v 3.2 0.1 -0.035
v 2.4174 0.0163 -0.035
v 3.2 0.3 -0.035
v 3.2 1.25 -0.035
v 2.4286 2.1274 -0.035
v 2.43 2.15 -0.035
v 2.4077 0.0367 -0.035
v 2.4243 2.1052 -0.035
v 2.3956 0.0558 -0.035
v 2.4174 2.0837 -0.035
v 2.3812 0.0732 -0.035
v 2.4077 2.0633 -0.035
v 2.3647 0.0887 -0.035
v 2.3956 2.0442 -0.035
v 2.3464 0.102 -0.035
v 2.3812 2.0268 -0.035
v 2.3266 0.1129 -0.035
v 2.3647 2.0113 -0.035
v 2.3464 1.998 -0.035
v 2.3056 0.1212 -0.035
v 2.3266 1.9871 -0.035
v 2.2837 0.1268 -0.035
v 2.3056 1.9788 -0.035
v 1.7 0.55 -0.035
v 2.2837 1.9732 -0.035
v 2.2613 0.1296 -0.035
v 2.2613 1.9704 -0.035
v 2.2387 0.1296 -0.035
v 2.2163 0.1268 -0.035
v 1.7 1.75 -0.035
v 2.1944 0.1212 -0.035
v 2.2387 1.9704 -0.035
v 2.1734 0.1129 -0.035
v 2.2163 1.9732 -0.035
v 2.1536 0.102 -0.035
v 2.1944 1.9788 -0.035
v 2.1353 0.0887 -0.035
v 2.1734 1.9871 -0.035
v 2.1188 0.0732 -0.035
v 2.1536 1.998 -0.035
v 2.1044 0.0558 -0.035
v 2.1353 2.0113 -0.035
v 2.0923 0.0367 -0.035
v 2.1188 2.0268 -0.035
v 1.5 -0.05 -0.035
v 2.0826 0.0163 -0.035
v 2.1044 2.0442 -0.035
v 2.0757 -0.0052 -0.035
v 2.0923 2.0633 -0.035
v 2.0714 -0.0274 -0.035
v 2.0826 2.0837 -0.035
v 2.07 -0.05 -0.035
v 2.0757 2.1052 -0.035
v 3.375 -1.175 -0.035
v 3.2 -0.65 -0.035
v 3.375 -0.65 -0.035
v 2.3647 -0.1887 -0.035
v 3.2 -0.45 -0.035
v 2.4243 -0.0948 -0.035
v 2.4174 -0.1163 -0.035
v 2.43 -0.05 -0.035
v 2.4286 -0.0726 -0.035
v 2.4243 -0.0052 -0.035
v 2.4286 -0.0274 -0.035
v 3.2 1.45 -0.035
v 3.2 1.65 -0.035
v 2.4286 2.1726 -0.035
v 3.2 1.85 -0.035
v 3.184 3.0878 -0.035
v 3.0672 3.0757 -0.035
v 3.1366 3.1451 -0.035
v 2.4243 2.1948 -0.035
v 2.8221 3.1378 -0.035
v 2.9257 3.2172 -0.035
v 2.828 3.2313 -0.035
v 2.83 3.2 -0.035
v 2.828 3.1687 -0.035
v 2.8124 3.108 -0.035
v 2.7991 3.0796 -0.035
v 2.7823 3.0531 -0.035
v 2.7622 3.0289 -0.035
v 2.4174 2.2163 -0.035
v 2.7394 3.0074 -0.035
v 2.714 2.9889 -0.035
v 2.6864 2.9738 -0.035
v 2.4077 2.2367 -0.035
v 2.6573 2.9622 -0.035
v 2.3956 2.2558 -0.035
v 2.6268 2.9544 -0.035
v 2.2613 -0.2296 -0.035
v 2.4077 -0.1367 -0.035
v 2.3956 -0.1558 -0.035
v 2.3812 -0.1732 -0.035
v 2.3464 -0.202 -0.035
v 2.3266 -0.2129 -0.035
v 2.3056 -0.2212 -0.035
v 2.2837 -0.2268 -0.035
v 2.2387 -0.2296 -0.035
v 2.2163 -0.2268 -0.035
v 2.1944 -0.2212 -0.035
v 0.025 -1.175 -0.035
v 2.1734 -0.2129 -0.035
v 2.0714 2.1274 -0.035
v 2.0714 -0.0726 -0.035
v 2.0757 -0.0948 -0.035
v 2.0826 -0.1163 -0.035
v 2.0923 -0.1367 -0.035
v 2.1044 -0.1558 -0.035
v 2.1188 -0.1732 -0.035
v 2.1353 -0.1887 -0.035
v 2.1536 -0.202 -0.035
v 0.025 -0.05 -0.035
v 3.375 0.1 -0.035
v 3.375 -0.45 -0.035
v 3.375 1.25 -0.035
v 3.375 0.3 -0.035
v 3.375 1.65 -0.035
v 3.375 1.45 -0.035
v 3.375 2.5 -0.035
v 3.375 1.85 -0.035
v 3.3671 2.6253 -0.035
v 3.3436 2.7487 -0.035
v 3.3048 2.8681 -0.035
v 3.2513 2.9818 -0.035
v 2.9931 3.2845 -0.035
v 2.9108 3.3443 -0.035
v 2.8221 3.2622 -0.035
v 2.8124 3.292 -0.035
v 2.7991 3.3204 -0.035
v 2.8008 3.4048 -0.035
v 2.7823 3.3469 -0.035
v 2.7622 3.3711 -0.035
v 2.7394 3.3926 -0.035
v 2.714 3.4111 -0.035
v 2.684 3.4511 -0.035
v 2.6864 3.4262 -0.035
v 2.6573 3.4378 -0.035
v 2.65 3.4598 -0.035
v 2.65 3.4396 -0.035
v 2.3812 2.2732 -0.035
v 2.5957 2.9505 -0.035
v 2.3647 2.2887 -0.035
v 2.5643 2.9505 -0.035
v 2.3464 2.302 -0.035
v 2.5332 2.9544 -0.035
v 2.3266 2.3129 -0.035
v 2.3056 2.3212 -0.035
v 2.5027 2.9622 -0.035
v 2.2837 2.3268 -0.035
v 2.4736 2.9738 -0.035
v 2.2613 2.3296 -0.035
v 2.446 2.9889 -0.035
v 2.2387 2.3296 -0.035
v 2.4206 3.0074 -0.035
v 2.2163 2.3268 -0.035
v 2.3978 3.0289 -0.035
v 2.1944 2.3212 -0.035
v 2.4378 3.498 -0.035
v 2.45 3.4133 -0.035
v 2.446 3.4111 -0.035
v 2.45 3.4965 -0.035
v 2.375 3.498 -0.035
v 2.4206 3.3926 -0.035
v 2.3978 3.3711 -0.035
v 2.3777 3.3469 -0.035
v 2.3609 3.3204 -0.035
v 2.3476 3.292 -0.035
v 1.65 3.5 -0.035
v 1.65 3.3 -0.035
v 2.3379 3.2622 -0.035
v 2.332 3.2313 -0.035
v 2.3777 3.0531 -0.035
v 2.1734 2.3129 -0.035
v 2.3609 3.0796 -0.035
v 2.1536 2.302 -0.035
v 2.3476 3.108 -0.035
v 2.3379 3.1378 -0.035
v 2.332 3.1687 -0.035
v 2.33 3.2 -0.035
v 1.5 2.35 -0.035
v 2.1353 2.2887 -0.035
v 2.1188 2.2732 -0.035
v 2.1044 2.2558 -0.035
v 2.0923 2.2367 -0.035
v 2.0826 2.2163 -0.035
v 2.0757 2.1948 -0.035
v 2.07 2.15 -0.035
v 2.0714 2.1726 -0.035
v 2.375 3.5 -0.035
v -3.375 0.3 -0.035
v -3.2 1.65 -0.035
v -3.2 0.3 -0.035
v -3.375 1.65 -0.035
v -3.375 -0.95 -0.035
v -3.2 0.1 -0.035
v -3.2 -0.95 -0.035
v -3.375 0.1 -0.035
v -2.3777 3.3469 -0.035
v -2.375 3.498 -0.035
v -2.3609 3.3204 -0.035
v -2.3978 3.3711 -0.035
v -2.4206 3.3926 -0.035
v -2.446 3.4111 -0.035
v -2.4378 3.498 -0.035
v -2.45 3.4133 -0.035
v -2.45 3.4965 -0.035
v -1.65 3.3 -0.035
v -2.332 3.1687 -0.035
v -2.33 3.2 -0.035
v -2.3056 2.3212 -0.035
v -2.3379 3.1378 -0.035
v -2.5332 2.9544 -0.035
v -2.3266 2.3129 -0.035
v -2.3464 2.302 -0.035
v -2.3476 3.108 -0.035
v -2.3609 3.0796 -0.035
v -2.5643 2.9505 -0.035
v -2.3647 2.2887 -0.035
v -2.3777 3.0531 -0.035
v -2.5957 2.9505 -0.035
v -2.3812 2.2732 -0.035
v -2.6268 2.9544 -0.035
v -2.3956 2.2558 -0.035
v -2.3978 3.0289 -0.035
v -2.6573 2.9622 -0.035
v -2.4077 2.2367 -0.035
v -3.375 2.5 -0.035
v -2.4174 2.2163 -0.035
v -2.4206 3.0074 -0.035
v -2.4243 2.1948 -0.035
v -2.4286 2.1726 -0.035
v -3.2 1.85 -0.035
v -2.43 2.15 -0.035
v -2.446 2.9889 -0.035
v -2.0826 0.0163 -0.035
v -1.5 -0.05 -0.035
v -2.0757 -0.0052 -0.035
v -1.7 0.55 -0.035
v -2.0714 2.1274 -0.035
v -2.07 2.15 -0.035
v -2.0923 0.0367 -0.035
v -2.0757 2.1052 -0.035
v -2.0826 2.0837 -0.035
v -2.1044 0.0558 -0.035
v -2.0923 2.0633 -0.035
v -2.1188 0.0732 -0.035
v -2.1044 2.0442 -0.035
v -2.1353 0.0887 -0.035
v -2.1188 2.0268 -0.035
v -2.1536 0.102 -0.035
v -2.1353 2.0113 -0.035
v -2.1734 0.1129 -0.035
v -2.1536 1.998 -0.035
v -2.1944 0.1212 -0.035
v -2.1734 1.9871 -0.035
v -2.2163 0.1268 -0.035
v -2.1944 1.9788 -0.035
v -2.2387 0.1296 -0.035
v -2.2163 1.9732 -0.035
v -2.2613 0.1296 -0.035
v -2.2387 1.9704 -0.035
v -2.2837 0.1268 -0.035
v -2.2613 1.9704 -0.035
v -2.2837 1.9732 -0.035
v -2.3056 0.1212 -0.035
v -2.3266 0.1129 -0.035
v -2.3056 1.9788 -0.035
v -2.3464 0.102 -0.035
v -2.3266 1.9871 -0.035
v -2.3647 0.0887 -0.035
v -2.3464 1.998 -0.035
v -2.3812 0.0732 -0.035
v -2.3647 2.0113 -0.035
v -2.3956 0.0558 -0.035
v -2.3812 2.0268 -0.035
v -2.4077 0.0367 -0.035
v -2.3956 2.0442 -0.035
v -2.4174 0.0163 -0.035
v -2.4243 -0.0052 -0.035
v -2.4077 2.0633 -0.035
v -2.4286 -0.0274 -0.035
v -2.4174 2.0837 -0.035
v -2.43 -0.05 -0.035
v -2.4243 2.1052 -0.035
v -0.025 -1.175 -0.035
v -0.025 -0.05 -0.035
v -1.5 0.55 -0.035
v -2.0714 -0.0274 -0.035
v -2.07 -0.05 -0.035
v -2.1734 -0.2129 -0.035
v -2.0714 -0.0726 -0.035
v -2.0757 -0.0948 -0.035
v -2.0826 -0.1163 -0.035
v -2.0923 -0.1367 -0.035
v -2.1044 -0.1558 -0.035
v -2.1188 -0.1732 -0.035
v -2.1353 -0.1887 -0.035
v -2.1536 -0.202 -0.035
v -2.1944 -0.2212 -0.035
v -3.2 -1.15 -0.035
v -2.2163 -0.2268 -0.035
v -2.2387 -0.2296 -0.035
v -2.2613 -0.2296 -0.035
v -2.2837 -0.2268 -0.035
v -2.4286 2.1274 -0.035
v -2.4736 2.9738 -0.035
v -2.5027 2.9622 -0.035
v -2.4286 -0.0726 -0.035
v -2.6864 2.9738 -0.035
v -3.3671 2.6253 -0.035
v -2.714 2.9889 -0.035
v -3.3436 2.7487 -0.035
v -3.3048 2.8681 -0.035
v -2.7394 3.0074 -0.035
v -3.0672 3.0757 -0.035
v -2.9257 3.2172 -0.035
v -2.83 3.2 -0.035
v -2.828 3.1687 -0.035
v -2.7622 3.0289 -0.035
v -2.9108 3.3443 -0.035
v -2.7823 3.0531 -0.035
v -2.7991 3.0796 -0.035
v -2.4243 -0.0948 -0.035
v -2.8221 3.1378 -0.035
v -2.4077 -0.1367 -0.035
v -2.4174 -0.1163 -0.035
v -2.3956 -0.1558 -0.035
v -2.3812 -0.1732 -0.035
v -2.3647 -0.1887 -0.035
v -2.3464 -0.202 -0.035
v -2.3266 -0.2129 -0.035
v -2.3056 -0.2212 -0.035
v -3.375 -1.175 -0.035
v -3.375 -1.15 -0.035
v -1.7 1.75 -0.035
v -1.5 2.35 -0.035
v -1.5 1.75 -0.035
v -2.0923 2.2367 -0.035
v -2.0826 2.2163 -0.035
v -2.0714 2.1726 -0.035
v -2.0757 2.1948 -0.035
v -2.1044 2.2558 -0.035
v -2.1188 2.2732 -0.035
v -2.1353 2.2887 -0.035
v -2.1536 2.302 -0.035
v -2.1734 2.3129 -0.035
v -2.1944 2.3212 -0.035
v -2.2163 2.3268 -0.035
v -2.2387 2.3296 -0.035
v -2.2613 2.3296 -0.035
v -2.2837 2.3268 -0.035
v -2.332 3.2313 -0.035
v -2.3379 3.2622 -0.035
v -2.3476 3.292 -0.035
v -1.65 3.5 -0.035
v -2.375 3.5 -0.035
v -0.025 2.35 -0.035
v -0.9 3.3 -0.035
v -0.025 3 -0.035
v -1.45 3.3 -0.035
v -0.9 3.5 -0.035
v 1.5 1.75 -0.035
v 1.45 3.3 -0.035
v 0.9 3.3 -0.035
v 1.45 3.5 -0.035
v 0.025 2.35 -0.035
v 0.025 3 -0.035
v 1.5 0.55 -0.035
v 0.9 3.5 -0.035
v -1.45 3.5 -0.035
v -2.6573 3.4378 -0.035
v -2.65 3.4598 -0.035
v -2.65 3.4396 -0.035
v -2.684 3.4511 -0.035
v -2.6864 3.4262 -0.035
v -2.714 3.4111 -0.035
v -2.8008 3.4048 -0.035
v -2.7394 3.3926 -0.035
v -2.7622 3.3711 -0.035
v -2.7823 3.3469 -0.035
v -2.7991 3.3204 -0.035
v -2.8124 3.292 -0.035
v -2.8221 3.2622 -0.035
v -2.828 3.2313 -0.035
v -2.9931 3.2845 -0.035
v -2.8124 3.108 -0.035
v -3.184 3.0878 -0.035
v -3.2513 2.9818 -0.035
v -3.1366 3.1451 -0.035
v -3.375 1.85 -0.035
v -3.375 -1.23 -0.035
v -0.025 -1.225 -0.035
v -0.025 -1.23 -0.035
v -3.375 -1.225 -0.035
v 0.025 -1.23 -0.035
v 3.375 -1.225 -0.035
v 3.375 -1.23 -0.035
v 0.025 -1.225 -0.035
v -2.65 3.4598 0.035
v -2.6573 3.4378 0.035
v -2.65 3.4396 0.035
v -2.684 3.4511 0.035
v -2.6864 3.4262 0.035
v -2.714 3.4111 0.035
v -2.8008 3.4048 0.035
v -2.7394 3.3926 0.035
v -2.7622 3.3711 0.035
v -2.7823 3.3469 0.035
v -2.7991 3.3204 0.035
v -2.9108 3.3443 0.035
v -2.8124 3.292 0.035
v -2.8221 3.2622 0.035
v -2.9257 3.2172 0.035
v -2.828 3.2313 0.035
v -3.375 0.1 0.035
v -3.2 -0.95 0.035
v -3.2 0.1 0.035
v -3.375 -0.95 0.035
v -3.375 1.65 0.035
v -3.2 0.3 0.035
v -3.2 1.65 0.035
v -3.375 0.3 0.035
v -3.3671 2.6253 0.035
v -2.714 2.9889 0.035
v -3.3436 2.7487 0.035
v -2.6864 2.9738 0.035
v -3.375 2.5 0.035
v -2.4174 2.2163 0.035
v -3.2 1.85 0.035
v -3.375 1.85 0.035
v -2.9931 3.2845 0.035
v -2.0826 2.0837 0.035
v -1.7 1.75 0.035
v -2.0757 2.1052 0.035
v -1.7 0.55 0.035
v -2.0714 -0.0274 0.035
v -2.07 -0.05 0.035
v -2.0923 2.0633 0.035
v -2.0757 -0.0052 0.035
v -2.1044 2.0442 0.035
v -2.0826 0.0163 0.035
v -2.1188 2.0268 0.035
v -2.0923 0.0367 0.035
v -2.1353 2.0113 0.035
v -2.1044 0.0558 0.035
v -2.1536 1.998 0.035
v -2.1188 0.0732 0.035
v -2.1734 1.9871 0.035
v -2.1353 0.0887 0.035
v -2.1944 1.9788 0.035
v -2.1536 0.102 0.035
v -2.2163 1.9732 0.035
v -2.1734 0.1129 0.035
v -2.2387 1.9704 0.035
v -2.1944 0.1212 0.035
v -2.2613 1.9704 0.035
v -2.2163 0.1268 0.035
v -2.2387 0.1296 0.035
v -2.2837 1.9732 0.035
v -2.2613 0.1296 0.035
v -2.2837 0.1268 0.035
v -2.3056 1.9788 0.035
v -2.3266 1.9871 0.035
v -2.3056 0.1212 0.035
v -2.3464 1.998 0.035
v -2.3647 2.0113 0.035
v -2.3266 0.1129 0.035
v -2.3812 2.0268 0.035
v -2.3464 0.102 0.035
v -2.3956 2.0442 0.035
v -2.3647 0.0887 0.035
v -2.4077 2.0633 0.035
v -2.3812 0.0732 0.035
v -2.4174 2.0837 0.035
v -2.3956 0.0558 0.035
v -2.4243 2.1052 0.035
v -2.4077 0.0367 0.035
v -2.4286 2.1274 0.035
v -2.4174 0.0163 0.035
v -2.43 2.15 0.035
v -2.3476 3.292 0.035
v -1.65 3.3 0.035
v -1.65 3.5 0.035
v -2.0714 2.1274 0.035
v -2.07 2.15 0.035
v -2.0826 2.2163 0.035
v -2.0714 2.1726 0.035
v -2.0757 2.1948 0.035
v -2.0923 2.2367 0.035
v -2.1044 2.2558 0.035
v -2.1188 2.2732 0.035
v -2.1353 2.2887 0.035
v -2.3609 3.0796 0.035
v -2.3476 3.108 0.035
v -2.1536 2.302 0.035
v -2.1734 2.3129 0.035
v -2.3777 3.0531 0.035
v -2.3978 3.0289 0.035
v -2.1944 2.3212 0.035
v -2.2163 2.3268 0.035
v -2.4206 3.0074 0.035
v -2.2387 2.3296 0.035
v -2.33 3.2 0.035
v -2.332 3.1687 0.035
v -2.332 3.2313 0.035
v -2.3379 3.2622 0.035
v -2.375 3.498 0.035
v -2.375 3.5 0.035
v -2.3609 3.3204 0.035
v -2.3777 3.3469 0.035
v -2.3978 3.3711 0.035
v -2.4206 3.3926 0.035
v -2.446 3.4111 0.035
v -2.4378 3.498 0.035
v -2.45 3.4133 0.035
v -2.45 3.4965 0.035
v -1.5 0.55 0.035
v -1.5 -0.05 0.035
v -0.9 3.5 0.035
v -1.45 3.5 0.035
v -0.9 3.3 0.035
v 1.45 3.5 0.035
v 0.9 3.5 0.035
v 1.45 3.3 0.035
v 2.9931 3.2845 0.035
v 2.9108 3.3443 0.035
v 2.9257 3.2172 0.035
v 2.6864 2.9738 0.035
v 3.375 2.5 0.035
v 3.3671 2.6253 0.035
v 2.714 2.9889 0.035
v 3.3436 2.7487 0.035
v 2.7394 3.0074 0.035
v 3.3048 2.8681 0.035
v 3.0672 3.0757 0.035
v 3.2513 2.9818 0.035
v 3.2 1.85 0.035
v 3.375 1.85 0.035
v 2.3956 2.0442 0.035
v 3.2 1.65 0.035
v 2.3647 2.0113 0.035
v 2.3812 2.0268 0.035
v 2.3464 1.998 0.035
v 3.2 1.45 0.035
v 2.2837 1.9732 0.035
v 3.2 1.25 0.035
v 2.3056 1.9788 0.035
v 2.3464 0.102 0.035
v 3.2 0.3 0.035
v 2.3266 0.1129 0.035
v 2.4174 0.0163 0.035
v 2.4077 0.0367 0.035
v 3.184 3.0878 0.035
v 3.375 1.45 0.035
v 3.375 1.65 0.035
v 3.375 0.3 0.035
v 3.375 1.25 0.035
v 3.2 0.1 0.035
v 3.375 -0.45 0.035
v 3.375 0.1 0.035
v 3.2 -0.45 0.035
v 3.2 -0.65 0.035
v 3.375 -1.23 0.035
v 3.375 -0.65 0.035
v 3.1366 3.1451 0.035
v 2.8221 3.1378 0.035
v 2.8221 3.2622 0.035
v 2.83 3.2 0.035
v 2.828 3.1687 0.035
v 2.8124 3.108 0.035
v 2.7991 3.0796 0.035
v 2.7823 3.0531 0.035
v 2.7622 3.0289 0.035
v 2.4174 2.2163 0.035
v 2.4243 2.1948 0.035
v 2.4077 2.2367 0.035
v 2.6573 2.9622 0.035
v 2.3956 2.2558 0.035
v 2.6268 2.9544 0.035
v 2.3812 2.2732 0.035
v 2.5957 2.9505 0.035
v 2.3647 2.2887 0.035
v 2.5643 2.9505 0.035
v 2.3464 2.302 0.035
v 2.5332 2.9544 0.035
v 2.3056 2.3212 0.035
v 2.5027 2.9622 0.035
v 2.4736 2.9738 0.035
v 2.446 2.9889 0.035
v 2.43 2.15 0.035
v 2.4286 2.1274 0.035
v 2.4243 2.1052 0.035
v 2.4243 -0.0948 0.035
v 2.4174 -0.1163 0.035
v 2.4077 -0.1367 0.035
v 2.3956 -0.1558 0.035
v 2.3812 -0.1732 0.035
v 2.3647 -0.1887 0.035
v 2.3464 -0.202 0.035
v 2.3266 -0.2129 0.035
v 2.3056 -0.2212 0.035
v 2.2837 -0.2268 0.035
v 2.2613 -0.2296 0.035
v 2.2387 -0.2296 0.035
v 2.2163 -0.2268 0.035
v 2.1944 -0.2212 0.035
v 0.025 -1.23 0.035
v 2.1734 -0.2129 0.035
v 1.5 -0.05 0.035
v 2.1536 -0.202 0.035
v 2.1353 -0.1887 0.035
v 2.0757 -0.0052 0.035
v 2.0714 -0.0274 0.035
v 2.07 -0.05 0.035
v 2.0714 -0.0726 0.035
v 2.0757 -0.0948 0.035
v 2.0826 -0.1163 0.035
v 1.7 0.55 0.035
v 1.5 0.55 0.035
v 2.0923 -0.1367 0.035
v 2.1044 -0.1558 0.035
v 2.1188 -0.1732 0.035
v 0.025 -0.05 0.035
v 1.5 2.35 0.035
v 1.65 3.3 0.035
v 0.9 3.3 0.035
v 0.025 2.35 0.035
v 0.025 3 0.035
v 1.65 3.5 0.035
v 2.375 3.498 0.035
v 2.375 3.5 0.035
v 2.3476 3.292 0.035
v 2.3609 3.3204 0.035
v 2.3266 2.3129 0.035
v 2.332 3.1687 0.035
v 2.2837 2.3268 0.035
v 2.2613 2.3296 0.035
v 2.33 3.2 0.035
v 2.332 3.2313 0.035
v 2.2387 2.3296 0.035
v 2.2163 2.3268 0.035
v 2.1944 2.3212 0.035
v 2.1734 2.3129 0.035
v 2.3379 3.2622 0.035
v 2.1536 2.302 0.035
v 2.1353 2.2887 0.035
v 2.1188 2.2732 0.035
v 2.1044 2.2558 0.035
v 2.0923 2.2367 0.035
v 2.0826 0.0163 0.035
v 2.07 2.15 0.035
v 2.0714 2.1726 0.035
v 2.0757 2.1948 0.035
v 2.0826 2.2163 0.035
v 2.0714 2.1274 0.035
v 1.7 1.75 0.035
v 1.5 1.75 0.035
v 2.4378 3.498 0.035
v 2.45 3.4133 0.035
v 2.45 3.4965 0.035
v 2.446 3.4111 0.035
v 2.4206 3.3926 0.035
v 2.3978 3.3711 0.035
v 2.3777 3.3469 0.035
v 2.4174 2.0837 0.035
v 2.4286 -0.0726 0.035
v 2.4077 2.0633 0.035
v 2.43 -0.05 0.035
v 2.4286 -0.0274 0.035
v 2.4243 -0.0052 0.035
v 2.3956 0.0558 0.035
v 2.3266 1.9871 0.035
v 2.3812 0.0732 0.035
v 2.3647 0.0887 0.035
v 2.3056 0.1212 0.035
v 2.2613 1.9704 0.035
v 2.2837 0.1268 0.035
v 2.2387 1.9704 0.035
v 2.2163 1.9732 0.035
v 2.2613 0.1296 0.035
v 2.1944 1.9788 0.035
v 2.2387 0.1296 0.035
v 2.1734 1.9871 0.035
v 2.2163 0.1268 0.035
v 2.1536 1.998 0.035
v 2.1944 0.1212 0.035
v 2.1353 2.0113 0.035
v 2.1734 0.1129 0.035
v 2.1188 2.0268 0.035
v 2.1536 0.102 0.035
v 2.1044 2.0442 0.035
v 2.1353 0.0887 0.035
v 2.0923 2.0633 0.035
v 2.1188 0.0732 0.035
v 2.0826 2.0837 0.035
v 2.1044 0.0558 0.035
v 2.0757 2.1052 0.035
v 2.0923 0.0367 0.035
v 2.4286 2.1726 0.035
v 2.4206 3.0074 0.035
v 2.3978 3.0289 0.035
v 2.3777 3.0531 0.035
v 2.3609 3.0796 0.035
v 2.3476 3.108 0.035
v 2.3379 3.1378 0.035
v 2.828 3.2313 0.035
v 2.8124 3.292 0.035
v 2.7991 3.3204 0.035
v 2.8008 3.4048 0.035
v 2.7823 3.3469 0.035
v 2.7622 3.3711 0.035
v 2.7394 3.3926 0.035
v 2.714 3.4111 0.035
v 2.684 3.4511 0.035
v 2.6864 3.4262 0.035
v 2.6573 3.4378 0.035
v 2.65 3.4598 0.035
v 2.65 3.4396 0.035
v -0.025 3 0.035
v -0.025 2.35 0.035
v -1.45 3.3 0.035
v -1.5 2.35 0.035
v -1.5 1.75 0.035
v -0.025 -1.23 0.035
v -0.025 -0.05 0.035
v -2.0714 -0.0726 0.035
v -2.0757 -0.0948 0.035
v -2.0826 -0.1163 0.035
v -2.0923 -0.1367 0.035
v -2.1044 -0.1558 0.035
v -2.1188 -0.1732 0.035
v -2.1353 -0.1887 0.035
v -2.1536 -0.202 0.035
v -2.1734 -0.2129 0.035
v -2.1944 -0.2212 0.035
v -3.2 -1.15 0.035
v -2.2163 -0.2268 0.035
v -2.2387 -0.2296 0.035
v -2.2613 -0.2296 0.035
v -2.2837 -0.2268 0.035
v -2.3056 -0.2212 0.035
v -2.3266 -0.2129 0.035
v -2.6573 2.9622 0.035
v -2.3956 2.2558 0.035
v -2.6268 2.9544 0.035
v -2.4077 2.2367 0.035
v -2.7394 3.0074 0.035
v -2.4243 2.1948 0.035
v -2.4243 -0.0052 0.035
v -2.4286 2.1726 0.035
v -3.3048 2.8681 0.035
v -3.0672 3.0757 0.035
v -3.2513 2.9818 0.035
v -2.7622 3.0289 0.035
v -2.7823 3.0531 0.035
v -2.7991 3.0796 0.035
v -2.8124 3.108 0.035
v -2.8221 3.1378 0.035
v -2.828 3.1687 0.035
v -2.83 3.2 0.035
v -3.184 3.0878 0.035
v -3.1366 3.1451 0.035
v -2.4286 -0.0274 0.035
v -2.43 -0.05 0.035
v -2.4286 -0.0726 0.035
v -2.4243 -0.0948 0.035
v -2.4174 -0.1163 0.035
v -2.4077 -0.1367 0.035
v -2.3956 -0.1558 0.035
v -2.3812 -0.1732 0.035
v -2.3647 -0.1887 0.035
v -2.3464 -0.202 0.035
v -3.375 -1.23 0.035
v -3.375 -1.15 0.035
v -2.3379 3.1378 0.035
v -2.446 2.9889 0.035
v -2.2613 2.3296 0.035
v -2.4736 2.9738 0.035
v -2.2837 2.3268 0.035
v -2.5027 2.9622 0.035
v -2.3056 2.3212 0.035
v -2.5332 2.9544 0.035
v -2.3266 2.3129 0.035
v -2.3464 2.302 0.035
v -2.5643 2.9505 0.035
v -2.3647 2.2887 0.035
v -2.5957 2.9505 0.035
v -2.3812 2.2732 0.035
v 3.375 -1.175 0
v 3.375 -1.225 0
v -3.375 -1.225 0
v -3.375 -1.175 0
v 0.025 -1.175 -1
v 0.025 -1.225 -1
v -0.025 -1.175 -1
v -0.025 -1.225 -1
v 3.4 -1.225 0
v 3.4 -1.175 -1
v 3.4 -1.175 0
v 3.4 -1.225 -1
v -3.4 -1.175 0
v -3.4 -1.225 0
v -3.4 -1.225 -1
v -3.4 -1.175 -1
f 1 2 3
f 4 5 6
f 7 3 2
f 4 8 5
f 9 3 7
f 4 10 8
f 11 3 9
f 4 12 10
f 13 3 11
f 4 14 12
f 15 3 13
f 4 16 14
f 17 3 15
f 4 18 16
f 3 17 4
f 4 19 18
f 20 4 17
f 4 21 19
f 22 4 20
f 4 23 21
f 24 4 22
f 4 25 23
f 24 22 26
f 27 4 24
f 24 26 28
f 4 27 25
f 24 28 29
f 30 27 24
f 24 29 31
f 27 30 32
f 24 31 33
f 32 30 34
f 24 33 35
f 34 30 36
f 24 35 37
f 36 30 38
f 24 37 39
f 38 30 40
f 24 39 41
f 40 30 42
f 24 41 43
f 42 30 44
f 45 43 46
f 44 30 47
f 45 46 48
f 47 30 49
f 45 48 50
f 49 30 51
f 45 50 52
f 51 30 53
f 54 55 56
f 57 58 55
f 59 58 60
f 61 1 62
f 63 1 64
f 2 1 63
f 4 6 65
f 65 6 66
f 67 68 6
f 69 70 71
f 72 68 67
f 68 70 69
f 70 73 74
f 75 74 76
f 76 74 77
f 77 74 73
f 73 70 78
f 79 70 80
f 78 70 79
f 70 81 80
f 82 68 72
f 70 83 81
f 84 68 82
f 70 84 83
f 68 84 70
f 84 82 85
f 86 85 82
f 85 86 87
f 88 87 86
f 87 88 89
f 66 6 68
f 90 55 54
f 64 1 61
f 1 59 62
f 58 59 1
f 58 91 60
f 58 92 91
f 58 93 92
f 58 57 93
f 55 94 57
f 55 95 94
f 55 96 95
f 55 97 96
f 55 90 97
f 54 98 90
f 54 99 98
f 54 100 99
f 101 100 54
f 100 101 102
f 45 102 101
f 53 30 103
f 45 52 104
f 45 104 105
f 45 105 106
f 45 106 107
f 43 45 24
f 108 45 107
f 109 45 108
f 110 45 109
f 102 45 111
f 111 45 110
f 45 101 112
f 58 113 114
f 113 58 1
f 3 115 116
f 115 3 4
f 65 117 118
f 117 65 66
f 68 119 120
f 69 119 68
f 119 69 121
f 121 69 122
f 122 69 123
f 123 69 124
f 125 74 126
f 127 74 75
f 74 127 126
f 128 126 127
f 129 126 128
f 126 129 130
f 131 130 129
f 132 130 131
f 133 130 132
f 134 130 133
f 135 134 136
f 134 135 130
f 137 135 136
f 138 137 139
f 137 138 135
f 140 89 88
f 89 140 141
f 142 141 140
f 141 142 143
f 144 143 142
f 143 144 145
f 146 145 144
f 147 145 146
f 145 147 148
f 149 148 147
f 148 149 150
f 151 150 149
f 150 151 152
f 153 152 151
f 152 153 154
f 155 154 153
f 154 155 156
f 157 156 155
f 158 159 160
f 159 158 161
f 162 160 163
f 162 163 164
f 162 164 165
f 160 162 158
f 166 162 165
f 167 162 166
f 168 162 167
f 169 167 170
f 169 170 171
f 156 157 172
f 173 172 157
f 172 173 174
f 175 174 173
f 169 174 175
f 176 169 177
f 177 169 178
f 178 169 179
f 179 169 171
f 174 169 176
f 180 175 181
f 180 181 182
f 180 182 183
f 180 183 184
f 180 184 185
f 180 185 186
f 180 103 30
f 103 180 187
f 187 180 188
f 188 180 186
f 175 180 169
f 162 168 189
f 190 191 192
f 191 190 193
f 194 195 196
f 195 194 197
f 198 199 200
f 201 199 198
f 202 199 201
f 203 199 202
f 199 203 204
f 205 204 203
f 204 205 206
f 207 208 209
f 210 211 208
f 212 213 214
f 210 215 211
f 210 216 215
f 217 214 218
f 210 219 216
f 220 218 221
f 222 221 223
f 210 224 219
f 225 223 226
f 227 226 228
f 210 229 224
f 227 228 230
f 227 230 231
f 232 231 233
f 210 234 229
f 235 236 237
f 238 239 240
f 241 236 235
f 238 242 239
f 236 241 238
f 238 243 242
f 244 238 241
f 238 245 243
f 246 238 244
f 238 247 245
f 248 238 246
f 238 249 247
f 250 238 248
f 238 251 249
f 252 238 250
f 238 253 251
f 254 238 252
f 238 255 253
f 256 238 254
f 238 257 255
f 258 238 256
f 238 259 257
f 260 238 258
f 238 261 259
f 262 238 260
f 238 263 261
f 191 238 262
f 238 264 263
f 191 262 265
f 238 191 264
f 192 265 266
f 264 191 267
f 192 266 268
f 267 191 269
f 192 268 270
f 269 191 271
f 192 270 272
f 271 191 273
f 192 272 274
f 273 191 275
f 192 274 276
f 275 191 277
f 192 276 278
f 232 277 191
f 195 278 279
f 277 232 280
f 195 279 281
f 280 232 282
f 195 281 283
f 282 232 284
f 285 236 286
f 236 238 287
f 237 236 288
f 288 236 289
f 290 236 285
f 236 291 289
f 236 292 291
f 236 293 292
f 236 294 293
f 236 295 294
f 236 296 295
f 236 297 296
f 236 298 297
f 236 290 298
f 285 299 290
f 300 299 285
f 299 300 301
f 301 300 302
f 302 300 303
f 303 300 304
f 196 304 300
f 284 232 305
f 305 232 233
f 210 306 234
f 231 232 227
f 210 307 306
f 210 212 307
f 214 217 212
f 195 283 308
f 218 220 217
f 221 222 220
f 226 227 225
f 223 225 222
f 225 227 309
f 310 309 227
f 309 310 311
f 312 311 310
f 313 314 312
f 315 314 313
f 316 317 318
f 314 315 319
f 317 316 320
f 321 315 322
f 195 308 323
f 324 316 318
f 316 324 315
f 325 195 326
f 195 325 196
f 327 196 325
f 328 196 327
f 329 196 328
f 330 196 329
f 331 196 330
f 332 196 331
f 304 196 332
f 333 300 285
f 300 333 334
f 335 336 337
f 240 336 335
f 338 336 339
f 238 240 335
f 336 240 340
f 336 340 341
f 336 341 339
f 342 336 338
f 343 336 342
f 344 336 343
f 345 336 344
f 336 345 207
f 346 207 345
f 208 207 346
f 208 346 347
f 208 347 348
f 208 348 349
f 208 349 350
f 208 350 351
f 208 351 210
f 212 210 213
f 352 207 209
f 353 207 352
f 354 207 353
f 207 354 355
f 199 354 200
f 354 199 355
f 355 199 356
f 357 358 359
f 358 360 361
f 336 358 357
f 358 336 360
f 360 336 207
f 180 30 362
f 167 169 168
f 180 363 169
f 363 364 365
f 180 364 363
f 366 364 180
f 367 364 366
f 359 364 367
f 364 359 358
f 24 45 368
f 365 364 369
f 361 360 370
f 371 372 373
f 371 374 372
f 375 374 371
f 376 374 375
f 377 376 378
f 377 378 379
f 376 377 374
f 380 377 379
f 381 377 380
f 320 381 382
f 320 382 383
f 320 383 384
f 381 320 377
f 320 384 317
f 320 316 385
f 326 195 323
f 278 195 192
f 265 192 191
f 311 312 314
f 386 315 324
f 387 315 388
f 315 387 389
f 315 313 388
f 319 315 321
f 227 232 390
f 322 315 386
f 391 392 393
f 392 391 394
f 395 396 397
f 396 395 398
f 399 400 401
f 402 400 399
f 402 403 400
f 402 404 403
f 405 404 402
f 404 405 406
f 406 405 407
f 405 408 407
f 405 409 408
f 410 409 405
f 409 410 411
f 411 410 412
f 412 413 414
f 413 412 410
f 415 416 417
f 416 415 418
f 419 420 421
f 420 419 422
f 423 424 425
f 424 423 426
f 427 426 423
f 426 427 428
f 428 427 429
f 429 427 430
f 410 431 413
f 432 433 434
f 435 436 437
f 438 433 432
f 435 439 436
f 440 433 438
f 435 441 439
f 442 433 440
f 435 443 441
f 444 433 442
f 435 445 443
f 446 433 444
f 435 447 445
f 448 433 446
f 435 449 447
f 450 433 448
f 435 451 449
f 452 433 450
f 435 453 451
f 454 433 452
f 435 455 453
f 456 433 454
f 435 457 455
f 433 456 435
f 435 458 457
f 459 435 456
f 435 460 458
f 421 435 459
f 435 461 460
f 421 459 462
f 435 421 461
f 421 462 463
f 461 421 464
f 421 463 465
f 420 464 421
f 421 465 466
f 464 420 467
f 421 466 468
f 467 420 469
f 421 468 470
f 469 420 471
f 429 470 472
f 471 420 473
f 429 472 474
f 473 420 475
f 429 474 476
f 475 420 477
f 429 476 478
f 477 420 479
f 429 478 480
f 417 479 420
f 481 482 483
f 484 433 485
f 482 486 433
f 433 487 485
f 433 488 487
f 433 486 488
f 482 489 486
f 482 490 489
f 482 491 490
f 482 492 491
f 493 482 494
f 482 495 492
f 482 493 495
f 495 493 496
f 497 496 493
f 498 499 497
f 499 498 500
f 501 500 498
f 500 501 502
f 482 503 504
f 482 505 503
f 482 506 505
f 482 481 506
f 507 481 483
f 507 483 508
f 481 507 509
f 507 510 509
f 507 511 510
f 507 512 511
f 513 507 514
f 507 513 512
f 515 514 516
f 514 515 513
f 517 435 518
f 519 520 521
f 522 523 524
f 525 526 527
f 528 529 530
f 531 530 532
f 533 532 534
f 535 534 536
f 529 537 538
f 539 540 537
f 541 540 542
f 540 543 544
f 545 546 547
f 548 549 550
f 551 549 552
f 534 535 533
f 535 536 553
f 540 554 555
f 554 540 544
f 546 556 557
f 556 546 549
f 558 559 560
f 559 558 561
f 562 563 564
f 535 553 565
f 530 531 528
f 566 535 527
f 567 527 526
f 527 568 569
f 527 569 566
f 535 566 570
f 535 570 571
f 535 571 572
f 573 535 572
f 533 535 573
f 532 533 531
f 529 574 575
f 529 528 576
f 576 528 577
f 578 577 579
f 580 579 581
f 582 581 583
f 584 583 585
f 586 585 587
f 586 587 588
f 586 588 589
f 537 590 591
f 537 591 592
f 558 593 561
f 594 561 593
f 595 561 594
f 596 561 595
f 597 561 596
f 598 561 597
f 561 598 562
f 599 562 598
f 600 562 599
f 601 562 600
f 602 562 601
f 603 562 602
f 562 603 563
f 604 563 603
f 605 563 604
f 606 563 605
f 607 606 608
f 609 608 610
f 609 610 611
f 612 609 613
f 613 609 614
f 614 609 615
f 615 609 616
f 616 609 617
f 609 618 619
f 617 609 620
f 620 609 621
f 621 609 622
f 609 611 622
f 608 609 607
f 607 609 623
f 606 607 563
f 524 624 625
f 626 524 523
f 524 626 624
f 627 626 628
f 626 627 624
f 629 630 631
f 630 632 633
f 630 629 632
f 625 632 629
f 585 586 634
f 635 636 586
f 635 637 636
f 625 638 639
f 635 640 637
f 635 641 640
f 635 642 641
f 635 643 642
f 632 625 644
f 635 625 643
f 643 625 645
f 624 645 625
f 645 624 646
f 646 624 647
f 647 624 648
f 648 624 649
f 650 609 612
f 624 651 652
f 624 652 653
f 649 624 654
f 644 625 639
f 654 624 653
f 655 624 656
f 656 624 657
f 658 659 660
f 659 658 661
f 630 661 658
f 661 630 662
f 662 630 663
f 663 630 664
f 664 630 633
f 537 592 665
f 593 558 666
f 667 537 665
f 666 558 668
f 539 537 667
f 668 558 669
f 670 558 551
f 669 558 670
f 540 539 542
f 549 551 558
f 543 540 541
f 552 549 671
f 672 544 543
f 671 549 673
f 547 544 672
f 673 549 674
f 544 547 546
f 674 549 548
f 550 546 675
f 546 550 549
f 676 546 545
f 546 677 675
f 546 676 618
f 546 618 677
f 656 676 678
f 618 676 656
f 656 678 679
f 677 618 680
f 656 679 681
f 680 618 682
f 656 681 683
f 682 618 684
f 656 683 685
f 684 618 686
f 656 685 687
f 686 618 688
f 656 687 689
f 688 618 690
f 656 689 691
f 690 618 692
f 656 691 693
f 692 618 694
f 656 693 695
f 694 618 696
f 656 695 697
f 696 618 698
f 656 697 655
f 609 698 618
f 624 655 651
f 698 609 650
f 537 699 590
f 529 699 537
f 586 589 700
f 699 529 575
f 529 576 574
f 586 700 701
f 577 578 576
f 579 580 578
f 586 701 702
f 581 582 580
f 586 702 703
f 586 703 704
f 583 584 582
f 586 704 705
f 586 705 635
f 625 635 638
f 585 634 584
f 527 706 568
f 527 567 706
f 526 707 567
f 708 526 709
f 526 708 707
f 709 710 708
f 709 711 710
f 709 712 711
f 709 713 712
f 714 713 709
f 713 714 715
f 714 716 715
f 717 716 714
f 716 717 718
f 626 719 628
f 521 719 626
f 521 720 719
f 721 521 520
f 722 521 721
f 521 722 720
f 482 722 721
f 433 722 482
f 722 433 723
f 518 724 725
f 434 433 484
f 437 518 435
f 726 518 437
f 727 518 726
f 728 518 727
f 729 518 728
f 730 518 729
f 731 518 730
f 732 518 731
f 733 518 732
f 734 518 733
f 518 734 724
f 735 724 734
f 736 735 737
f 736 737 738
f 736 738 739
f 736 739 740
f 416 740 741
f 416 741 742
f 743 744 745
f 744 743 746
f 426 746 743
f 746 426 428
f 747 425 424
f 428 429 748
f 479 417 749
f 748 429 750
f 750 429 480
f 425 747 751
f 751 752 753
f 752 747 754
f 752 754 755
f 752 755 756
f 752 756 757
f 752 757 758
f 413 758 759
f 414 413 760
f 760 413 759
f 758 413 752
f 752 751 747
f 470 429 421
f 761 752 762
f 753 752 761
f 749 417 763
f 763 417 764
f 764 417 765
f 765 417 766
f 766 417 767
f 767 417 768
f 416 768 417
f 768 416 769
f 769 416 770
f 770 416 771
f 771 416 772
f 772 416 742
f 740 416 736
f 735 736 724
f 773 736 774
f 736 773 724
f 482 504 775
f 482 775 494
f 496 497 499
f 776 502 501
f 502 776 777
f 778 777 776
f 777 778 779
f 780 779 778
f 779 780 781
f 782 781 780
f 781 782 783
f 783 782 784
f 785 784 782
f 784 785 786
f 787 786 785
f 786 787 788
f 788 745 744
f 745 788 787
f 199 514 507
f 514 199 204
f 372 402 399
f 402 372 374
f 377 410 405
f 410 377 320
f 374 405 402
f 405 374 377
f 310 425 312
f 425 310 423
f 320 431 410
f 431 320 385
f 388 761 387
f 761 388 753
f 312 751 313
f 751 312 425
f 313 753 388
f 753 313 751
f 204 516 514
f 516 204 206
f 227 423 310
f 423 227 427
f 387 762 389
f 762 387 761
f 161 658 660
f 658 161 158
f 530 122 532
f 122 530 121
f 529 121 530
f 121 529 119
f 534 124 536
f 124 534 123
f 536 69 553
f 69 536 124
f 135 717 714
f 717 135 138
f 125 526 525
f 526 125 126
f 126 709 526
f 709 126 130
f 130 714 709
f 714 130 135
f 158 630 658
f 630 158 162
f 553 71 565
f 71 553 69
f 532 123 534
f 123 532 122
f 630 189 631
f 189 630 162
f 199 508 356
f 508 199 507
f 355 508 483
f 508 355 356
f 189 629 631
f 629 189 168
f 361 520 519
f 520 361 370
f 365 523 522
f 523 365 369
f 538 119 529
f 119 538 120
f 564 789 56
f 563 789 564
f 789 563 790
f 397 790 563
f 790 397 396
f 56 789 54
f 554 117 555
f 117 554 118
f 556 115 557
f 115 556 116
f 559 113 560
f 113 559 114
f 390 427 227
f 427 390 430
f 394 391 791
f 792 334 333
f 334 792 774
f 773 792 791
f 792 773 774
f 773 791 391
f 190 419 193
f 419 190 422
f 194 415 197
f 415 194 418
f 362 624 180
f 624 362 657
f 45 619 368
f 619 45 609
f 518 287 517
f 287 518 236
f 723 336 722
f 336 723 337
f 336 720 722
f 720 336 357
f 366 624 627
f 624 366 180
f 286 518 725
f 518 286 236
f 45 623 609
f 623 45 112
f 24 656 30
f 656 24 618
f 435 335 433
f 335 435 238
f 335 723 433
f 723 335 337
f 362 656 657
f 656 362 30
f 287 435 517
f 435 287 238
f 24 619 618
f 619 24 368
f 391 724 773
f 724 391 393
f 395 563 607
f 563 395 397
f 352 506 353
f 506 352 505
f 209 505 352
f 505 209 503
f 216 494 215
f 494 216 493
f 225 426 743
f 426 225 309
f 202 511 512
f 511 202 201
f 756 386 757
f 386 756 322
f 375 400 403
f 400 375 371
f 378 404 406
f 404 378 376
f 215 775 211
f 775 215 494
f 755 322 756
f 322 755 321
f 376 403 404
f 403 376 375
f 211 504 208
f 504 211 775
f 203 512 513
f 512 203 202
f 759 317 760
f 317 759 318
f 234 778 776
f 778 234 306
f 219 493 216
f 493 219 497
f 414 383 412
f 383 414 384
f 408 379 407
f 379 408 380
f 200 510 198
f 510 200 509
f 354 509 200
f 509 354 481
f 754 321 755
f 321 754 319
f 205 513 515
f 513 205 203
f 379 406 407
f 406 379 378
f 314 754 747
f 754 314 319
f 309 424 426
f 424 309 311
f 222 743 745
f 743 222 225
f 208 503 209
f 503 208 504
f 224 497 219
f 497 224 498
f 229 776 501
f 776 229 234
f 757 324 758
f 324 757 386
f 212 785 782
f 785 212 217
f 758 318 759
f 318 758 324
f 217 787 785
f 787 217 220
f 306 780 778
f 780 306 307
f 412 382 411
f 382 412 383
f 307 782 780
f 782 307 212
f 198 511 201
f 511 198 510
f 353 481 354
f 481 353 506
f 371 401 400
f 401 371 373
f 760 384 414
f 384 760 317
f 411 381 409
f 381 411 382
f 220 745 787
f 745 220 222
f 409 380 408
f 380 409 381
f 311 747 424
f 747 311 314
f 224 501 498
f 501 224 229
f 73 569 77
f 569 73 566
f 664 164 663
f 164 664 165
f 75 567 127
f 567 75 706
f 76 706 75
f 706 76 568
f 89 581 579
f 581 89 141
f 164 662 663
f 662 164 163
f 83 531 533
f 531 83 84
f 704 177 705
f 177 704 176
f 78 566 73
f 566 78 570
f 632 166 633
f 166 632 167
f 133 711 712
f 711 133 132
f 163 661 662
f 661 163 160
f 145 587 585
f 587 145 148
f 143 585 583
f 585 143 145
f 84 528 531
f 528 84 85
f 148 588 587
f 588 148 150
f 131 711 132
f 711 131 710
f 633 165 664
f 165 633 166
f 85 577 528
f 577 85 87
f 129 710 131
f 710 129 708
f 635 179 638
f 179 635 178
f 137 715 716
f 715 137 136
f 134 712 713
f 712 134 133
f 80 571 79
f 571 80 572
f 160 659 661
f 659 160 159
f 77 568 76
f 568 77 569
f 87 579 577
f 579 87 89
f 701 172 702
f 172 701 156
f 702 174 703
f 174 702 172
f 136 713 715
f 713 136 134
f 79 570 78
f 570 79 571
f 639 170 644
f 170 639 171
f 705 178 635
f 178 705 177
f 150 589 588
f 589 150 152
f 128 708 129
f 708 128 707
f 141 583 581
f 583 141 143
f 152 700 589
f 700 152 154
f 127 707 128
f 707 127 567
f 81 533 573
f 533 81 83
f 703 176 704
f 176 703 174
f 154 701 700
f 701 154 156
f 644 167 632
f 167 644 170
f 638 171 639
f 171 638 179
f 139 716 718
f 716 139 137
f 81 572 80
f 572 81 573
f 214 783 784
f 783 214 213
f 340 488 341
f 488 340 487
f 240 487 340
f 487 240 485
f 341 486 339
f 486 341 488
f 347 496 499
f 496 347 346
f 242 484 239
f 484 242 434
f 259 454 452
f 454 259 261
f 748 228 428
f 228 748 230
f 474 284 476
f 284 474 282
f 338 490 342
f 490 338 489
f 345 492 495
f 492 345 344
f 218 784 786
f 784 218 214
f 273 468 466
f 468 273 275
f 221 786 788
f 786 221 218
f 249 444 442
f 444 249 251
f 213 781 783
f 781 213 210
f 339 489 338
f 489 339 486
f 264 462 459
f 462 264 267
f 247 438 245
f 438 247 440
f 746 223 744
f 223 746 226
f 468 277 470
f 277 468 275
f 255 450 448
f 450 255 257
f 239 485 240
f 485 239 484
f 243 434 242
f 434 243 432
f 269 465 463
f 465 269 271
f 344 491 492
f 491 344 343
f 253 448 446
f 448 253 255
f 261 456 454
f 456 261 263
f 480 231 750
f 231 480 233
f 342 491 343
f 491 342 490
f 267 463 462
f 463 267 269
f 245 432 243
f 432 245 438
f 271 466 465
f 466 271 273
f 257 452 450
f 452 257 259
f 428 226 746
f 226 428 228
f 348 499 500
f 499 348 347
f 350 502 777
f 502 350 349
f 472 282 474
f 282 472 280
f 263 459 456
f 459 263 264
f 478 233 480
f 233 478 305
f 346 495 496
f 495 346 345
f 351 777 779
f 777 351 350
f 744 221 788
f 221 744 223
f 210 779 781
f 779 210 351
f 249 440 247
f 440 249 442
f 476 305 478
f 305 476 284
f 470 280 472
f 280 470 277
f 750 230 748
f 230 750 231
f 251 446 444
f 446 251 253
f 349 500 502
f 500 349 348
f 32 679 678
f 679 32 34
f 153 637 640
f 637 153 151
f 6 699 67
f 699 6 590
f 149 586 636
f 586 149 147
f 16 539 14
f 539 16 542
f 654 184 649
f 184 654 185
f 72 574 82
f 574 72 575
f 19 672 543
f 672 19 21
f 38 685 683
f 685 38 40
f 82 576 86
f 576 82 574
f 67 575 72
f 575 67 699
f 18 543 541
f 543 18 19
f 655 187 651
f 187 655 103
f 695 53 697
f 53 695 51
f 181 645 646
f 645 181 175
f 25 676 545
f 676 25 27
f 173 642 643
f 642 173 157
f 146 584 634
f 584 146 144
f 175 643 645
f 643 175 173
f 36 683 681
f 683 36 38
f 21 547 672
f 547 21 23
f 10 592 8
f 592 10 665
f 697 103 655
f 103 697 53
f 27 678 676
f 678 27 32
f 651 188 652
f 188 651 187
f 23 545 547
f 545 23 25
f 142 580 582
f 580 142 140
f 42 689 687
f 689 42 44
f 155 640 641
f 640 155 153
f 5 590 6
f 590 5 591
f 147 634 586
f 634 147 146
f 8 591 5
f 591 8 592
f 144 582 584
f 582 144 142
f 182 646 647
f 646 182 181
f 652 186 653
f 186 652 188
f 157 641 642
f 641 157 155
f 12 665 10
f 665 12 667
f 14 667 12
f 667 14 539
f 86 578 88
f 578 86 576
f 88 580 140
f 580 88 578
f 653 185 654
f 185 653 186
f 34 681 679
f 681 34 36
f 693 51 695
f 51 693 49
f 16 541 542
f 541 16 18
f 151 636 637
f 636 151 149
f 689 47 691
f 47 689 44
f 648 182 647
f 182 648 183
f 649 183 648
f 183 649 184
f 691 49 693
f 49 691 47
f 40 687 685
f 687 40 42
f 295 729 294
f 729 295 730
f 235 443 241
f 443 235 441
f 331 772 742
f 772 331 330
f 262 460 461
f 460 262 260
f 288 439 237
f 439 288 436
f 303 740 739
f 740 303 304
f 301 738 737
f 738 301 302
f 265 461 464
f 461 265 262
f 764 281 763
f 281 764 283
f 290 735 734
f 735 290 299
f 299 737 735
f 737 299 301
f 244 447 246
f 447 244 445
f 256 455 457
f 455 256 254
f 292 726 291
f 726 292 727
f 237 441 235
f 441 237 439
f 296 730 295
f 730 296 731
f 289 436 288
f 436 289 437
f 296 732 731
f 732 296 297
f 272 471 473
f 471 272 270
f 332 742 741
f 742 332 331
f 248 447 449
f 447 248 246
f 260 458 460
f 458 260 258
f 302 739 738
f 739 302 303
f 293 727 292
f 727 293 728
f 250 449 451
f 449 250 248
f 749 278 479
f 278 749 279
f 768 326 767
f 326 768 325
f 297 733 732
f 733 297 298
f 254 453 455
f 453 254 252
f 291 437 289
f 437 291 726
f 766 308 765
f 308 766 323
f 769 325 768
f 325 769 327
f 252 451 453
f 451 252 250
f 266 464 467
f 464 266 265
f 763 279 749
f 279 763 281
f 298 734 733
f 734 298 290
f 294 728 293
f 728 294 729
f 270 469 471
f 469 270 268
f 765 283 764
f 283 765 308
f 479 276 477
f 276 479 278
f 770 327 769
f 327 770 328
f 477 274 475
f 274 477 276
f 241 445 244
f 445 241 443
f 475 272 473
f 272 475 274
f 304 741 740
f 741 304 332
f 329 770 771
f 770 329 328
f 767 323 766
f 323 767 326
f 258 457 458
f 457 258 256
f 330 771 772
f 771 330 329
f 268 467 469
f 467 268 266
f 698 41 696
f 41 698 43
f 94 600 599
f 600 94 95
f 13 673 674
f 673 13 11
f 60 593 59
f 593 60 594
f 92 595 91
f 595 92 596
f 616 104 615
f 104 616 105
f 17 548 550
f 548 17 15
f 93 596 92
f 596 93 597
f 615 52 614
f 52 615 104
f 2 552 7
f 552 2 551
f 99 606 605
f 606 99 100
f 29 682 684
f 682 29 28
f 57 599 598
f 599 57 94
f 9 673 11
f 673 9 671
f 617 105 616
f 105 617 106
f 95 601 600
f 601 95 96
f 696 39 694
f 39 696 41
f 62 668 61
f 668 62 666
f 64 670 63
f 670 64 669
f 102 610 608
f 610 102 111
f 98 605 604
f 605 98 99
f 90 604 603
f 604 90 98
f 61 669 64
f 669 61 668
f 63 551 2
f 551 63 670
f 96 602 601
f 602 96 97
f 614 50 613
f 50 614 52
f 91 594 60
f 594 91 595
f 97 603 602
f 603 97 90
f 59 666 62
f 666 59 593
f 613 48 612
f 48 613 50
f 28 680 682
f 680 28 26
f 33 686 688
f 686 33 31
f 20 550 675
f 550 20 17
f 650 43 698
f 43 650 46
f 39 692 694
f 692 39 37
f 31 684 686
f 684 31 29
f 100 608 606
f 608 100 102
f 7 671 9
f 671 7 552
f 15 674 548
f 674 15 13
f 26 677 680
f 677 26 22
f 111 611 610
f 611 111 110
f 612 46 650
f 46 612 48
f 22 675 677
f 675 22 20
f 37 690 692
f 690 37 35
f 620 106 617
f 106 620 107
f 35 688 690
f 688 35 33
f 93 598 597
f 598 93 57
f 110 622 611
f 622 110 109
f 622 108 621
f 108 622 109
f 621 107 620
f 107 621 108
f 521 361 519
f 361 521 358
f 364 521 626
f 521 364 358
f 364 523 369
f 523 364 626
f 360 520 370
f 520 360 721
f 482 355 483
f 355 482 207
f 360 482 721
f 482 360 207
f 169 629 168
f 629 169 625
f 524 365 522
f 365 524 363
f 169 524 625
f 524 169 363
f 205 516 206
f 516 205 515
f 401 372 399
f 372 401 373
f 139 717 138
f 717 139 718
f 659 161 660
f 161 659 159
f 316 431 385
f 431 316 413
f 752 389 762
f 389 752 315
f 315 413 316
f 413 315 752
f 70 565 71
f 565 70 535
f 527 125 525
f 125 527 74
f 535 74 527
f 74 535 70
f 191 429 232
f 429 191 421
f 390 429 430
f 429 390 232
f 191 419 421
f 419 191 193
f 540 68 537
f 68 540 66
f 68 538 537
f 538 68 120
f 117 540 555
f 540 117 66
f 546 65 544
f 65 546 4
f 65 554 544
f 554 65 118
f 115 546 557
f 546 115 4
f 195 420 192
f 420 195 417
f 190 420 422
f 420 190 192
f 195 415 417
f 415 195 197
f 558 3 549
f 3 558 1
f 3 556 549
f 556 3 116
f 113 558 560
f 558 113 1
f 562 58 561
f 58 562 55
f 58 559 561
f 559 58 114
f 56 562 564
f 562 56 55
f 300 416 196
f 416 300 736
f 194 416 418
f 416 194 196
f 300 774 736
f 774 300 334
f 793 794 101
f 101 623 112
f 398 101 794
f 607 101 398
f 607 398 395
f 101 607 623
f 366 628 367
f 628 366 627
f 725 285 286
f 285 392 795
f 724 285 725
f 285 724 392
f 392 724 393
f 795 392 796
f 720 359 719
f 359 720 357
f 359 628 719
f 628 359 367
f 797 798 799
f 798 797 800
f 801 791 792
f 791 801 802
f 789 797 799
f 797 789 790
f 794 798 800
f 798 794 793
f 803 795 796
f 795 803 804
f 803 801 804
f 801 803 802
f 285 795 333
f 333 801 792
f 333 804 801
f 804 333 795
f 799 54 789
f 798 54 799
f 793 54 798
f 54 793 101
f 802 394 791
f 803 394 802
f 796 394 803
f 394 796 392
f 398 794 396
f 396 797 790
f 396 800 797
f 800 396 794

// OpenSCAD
use <MCAD/boxes.scad>

$fn = 50;

cornerRadius = 1.0;
notchWidth = 0.2;

baffleWidth = 6.8;
baffleThickness = 0.07;


difference()
{
    roundedBox([6.75,7.0,baffleThickness], cornerRadius, true );


    translate([0, 1.15, 0])
    cube([3.0,2.4,0.2], true);
    
    translate([0,1.15,0])
    cube([3.4,1.2,1], true);
    
    translate([0,-1.5 - 1.23,0])
    cube([10,3,1], true);
    
   
    //  Top holes
    
    translate([-2.58, 3.2, 0])
    cylinder( h=2, r=0.25, center=true );
    
    translate([2.58, 3.2, 0])
    cylinder( h=2, r=0.25, center=true );

    //  Post holes
    
        
    translate([-2.25, 2.15, -0.4])
    cylinder( h=1, r=0.18, center=true );
    
    translate([2.25, 2.15, -0.4])
    cylinder( h=1, r=0.18, center=true );
    
    translate([-2.25, -0.05, -0.4])
    cylinder( h=1, r=0.18, center=true );
    
    translate([2.25, -0.05, -0.4])
    cylinder( h=1, r=0.18, center=true );



    //  Top Notches
    
    translate([-0.8,3.8,0])
    cube([notchWidth,1,1], true);
    
    translate([0.8,3.8,0])
    cube([notchWidth,1,1], true);
    
    translate([0,3.8,0])
    cube([1.5,1,1], true);
    
    translate([-1.55,3.8,0])
    cube([notchWidth,1,1], true);
    
    translate([1.55,3.8,0])
    cube([notchWidth,1,1], true);
    
    translate([-2.55,3.8,0])
    cube([notchWidth,1,1], true);
    
    translate([2.55,3.8,0])
    cube([notchWidth,1,1], true);
    
    
    //  Corner Notches
    
    translate([-3.35,3.5,0])
    rotate([0,0,45])
    cube([notchWidth,1,1], true);
    
    translate([3.35,3.5,0])
    rotate([0,0,-45])
    cube([notchWidth,1,1], true);
    
    //  Side Notches
        
    translate([-3.7,1.75,0])
    cube([1,notchWidth,1], true);
        
    translate([3.7,1.75,0])
    cube([1,notchWidth,1], true);
        
    translate([3.7,1.35,0])
    cube([1,notchWidth,1], true);
        
    translate([-3.7,0.2,0])
    cube([1,notchWidth,1], true);
        
    translate([3.7,0.2,0])
    cube([1,notchWidth,1], true);
        
    translate([3.7,-0.55,0])
    cube([1,notchWidth,1], true);

    translate([-3.7,-1.05,0])
    cube([1,notchWidth,1], true);
    
    //  Slice through the middle
    
    translate([0,-5,0])
    cube([0.05, 16, 2], true);
}


     //  Posts
/*    
    translate([-2.25, 2.15, -0.51])
    difference()
    {
        cylinder( h=1.1, r=0.16, center=true );
        
        translate([0,0,0.07])
        cylinder( h=1.1, r=0.115, center=true );
        
        translate([0,0,-1.0])
        cylinder( h=2, r=0.06, center=true );
    }
    
    translate([2.25, 2.15, -0.51])
    difference()
    {
        cylinder( h=1.1, r=0.16, center=true );
        
        translate([0,0,0.07])
        cylinder( h=1.1, r=0.115, center=true );
        
        translate([0,0,-1.0])
        cylinder( h=2, r=0.06, center=true );
    }
    
    translate([-2.25, -0.05, -0.51])
    difference()
    {
        cylinder( h=1.1, r=0.16, center=true );
        
        translate([0,0,0.07])
        cylinder( h=1.1, r=0.115, center=true );
        
        translate([0,0,-1.0])
        cylinder( h=2, r=0.06, center=true );
    }
    
    translate([2.25, -0.05, -0.51])
    difference()
    {
        cylinder( h=1.1, r=0.16, center=true );
        
        translate([0,0,0.07])
        cylinder( h=1.1, r=0.115, center=true );
        
        translate([0,0,-1.0])
        cylinder( h=2, r=0.06, center=true );
    }
*/
    //  Slight overhangs above and below heat sink

//    translate([0, 2.5, 0])
//    cube([2.4, 0.5, baffleThickness], true);

//    difference()
//    {
//        translate([0, -0.2, 0])
//        cube([2.4, 0.5, baffleThickness], true);

 //       translate([0,-2,0])
 //       cube([0.05, 6, 2], true);
//    }

    //  Bottom Lip

    difference()
    {   
        translate([0,-1.2,-0.5])
        cube([baffleWidth, 0.05, 1], true);

    
    //  Slice through the lip
    
        translate([0,-2,0])
        cube([0.05, 6, 2], true);
    }
